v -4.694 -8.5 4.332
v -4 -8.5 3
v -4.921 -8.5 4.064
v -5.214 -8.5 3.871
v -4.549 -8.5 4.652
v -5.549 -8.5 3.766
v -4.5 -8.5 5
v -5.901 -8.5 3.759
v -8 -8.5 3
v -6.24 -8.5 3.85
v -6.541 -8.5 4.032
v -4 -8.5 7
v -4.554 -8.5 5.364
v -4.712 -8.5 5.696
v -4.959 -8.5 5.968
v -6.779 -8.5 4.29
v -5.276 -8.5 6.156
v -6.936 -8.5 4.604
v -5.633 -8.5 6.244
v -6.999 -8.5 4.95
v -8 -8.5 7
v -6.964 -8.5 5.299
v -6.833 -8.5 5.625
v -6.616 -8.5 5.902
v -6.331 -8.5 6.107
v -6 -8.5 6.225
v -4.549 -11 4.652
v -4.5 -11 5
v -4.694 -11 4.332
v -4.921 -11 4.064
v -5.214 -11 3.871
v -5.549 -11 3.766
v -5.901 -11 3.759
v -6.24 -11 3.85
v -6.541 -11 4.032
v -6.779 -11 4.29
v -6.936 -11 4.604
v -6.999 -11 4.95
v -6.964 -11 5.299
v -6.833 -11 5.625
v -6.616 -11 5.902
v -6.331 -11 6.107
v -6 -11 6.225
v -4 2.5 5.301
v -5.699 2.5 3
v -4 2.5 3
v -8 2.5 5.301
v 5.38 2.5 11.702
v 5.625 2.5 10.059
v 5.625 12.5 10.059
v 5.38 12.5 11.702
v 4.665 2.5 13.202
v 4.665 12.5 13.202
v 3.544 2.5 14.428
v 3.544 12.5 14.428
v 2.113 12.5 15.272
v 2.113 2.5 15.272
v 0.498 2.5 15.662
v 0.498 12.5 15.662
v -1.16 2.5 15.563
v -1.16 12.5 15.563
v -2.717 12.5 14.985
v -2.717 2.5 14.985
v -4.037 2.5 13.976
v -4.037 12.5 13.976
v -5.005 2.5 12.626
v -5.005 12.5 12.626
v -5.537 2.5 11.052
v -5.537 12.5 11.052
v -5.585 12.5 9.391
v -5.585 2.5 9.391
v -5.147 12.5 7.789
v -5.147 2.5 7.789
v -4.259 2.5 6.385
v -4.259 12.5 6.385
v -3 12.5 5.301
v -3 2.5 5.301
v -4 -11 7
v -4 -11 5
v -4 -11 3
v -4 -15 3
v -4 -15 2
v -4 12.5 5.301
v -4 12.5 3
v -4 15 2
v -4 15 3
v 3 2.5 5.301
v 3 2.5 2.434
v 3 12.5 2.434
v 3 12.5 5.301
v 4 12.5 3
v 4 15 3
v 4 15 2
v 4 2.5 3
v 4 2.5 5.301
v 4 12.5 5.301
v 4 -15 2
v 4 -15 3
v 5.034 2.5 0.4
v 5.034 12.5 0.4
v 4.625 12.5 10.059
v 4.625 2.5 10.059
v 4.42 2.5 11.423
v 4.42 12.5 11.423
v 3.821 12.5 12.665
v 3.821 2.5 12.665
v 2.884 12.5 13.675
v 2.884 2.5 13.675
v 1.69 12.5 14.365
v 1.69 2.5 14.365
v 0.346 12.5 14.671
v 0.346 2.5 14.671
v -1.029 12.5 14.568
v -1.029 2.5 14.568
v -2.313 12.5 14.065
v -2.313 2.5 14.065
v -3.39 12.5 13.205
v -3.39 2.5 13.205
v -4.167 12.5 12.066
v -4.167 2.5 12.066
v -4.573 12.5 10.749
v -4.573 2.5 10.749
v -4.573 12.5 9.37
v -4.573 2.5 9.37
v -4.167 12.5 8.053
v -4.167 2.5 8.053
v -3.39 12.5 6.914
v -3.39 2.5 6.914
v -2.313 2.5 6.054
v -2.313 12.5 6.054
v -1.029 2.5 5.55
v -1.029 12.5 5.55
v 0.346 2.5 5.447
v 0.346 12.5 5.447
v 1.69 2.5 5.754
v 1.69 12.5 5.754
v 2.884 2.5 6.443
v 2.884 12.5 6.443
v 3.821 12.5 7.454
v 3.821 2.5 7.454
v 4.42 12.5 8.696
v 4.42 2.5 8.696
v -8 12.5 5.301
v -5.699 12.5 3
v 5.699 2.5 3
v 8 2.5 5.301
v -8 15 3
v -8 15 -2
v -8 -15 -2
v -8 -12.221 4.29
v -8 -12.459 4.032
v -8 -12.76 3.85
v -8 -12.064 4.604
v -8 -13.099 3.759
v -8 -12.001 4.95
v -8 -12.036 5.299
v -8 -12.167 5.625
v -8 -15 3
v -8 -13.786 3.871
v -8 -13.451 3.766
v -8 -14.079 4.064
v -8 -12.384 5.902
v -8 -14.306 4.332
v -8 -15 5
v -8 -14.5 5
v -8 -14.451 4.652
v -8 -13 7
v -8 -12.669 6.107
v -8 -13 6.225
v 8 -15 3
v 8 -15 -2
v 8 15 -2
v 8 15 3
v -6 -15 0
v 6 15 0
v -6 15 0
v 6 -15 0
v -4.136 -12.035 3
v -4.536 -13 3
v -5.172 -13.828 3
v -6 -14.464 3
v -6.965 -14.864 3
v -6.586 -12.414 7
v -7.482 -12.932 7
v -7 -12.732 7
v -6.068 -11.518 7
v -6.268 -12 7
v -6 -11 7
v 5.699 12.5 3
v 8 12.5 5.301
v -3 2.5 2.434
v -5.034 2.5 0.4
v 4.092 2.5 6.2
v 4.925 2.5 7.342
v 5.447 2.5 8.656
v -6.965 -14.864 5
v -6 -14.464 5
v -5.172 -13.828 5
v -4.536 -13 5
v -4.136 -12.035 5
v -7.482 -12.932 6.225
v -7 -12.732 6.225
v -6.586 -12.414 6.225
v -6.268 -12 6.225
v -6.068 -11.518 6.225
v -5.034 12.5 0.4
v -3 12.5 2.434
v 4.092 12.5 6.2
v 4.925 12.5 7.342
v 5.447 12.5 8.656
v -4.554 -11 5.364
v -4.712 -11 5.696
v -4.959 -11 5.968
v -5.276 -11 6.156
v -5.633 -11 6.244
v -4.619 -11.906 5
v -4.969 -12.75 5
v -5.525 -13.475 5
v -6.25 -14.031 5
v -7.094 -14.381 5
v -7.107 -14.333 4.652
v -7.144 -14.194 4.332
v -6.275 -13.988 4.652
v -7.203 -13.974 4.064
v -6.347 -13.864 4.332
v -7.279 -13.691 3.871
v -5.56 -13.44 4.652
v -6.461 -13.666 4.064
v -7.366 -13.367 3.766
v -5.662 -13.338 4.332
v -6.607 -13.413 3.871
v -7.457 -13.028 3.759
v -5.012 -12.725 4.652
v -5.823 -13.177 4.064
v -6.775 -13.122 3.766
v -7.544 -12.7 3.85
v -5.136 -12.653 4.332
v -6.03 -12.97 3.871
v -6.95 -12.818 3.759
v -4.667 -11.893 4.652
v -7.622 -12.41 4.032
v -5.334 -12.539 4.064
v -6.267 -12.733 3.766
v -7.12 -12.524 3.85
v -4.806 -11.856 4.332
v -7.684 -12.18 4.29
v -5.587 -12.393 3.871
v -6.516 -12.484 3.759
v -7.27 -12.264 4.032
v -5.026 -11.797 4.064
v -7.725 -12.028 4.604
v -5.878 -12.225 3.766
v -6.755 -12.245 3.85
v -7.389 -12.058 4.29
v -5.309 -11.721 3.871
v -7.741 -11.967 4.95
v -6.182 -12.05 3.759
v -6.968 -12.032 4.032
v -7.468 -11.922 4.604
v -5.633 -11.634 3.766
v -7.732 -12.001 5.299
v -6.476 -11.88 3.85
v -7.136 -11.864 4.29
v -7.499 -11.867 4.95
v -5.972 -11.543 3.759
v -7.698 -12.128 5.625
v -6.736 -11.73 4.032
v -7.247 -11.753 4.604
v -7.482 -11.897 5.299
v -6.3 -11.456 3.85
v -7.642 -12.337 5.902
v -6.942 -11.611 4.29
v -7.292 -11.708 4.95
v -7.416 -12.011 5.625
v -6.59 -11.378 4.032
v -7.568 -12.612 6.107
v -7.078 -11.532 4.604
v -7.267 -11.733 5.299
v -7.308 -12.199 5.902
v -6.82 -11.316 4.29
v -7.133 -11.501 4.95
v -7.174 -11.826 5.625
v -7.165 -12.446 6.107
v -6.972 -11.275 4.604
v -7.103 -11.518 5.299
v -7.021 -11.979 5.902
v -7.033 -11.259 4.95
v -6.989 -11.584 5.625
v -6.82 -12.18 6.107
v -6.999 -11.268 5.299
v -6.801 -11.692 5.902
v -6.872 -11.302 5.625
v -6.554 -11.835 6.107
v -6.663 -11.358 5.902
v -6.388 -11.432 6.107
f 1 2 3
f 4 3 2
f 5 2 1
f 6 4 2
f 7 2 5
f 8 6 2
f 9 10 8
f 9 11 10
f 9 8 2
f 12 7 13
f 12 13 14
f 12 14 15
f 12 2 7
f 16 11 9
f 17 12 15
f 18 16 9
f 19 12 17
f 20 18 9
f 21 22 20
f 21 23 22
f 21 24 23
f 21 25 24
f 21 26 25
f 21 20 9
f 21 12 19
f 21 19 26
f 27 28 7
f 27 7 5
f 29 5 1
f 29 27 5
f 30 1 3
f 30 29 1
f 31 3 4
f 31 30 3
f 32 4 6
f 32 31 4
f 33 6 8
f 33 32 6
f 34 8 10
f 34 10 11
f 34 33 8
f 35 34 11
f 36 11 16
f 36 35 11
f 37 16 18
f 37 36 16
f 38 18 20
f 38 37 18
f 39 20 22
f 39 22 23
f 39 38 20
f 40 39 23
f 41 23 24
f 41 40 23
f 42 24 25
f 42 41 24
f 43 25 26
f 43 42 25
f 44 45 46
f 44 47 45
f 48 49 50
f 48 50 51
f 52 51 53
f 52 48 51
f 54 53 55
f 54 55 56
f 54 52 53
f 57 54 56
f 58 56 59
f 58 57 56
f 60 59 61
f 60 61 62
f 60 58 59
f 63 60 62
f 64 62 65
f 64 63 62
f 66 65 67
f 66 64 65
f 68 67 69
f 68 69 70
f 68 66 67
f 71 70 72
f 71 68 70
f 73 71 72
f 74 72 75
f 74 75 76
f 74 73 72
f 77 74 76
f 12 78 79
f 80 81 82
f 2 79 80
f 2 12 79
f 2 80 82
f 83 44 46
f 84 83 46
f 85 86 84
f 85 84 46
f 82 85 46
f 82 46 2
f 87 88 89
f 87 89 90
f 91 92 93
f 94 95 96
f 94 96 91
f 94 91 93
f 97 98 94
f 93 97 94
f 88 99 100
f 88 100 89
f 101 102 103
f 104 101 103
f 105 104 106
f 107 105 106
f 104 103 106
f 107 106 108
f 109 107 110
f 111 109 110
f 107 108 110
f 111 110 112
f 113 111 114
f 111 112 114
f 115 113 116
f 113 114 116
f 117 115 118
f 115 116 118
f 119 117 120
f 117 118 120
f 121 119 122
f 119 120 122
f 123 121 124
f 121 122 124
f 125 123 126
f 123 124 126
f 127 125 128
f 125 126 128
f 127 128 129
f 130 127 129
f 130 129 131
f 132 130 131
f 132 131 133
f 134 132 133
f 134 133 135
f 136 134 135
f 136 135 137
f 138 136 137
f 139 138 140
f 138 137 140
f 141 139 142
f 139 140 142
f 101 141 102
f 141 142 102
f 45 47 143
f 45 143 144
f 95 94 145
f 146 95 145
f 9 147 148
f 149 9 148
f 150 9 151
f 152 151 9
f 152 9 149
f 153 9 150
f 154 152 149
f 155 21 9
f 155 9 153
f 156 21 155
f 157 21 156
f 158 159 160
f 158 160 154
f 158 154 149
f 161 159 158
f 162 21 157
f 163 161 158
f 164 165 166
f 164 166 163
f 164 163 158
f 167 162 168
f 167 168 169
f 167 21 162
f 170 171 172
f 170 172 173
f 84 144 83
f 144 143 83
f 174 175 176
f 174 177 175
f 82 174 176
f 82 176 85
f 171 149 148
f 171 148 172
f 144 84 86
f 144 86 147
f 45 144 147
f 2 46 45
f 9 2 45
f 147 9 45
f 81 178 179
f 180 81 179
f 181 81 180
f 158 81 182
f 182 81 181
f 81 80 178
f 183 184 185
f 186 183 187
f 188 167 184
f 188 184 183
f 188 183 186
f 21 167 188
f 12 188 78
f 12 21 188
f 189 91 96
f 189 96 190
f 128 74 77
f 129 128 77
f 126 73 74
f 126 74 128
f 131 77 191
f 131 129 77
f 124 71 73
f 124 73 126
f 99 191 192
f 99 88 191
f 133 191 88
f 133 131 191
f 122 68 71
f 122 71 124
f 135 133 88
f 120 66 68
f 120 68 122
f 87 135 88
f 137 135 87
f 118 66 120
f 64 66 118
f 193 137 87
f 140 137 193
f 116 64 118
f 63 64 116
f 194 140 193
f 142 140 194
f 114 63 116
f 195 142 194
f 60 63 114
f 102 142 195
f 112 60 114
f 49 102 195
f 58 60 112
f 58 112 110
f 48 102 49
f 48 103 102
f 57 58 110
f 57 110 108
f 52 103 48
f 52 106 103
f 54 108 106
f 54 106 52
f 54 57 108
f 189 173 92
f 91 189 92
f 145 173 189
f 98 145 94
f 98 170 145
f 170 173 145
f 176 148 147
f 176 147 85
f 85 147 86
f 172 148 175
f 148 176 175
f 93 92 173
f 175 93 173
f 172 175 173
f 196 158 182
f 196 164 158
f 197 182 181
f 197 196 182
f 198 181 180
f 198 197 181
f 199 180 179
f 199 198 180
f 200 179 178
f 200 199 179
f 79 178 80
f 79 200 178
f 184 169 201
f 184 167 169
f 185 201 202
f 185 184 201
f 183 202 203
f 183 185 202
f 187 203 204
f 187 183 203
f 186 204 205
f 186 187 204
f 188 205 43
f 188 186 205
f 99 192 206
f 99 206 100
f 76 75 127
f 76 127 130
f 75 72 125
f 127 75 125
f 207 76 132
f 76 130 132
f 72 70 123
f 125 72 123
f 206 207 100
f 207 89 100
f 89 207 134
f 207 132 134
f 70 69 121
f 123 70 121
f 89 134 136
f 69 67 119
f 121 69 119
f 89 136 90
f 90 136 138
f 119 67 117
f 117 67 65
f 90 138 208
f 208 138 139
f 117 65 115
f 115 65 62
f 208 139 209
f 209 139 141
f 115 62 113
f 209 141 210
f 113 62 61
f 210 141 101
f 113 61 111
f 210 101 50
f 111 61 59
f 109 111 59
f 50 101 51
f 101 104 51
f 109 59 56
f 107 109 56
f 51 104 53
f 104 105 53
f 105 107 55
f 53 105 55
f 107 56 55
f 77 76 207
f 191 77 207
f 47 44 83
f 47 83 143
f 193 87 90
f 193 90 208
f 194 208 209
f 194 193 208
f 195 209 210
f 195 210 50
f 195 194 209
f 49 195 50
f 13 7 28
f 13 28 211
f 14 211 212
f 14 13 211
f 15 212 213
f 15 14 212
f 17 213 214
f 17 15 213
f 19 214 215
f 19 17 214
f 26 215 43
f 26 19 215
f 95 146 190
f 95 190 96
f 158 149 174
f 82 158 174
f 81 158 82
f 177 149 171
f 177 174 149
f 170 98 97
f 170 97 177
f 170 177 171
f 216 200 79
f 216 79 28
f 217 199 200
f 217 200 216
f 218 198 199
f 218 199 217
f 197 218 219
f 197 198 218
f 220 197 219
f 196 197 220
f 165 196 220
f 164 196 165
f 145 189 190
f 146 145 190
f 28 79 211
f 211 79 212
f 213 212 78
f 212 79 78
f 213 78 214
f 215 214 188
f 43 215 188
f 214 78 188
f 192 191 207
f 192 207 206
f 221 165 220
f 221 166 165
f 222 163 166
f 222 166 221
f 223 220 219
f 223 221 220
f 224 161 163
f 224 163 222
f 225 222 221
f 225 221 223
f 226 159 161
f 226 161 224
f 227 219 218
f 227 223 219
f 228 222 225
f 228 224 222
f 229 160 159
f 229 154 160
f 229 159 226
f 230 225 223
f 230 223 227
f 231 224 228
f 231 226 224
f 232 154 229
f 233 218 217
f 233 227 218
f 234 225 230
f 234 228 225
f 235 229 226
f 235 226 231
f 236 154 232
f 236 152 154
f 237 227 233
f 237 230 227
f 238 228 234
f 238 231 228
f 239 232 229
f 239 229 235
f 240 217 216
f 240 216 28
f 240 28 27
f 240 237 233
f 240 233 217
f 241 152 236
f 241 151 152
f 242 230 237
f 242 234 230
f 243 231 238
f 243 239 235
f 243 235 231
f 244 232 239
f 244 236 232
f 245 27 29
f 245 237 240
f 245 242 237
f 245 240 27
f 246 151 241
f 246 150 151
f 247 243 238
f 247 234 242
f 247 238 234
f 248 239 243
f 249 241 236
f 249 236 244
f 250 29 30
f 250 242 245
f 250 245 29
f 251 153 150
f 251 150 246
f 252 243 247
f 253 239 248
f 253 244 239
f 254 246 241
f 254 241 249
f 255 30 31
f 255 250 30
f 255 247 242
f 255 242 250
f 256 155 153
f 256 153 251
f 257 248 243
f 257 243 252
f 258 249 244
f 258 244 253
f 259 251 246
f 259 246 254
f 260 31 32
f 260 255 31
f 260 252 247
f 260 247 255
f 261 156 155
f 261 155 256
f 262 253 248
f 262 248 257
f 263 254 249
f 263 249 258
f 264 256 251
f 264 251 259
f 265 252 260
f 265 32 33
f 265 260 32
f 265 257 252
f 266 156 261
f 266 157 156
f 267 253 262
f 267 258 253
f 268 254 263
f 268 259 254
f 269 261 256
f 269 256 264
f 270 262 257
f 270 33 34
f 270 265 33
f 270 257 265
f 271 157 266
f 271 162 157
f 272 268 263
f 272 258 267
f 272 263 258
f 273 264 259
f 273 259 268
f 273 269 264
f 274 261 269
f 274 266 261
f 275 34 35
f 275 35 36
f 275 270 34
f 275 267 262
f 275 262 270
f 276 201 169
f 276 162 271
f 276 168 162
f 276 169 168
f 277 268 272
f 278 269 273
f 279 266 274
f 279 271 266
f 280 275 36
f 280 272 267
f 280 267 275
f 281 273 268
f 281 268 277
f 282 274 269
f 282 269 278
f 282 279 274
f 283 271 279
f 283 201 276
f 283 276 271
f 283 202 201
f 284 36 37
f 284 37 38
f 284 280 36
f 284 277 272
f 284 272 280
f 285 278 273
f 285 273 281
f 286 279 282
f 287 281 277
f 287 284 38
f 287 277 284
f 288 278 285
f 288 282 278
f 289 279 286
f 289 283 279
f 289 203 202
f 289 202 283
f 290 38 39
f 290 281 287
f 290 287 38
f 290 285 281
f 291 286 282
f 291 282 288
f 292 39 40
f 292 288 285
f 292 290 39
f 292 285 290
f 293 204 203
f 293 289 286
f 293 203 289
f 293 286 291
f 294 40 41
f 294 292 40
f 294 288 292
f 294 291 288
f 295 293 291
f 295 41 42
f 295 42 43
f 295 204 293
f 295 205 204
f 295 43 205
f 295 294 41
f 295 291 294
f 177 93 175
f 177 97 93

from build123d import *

# Parameters (mm, degrees)
F1_DEPTH = 15
F2_START = -2.5
F0_R     = 4.625
F2_DEPTH = 10
F3_START = -2.5
F3_DEPTH = 10
F5_ANGLE = 90
F6_DEPTH = 2.5
F8_DEPTH = 2.5


with BuildPart() as f1:
    # F0 (on Front) → F1 (new body, symmetric)
    with BuildSketch(Plane.XZ):
        Polygon((6, 0), (0, 0), (-6, 0), (-4, 2), (-4, 3), (-5.6989020026, 3), (-8, 3), (-8, -2), (0, -2), (8, -2), (8, 3), (5.6989020026, 3), (4, 3), (4, 2), align=None)
    extrude(amount=F1_DEPTH, both=True)

    # F0 (on Front) → F3 (join)
    with BuildSketch(Plane.XZ.offset(F3_START)):
        Polygon((-5.6989020026, 3), (-4, 3), (-4, 5.3010979974), (-8, 5.3010979974), align=None)
        Polygon((4, 5.3010979974), (4, 3), (5.6989020026, 3), (8, 5.3010979974), align=None)
    extrude(amount=-F3_DEPTH)

    # F4 (on face) → F5 (revolve)
    with BuildSketch(Plane(origin=(-8, 0, 0), x_dir=(0, -1, 0), z_dir=(-1, 0, 0))):
        with BuildLine():
            Line((11, 3), (15, 3))
            Line((15, 3), (15, 5))
            Line((15, 5), (14.5, 5))
            ThreePointArc((14.5, 5), (12.459430585, 4.0317541634), (13, 6.2247448714))
            Line((13, 6.2247448714), (13, 7))
            Line((13, 7), (11, 7))
            Line((11, 7), (11, 3))
        make_face()
    revolve(axis=Axis((-8, -11, 5), (0, 0, 1)), revolution_arc=F5_ANGLE)

    # F6 (add): a face of the model
    f6_faces = [f1.faces().sort_by_distance(p)[0] for p in [
        (-6, -11, 3.0565685425),
    ]]
    extrude(f6_faces, amount=F6_DEPTH)

    # F7 (on face) → F8 (join)
    with BuildSketch(Plane(origin=(0, -8.5, 0), x_dir=(-1, 0, 0), z_dir=(0, 1, 0))):
        with BuildLine():
            Line((4, 7), (4, 5))
            Line((4, 5), (4.5, 5))
            ThreePointArc((4.5, 5), (4.959430585, 5.9682458366), (6, 6.2247448714))
            Line((6, 6.2247448714), (6, 7))
            Line((6, 7), (4, 7))
        make_face()
    extrude(amount=-F8_DEPTH)


with BuildPart() as f2:
    # F0 (on Front) → F2 (new body)
    with BuildSketch(Plane.XZ.offset(F2_START)):
        Polygon((-5.0343145751, 0.4), (0, 0.4), (5.0343145751, 0.4), (3, 2.4343145751), (3, 4.4343145751), (0, 4.4343145751), (-3, 4.4343145751), (-3, 2.4343145751), align=None)
        with BuildLine():
            Line((-3, 5.3010979974), (-3, 4.4343145751))
            Line((-3, 4.4343145751), (0, 4.4343145751))
            ThreePointArc((0, 4.4343145751), (-1.5613546603, 4.6553533775), (-3, 5.3010979974))
        make_face()
        with BuildLine():
            ThreePointArc((-3, 5.3010979974), (-1.5613546603, 4.6553533775), (0, 4.4343145751))
            ThreePointArc((0, 4.4343145751), (1.5613546603, 4.6553533775), (3, 5.3010979974))
            ThreePointArc((3, 5.3010979974), (4.9252220762, 7.3421814351), (5.625, 10.0593145751))
            ThreePointArc((5.625, 10.0593145751), (-2.7171331399, 14.9845366513), (-3, 5.3010979974))
        make_face()
        with Locations((0, 10.0593145751)):
            Circle(F0_R, mode=Mode.SUBTRACT)
        with BuildLine():
            Line((0, 4.4343145751), (3, 4.4343145751))
            Line((3, 4.4343145751), (3, 5.3010979974))
            ThreePointArc((3, 5.3010979974), (1.5613546603, 4.6553533775), (0, 4.4343145751))
        make_face()
    extrude(amount=-F2_DEPTH)


solid = Compound([f1.part, f2.part])
